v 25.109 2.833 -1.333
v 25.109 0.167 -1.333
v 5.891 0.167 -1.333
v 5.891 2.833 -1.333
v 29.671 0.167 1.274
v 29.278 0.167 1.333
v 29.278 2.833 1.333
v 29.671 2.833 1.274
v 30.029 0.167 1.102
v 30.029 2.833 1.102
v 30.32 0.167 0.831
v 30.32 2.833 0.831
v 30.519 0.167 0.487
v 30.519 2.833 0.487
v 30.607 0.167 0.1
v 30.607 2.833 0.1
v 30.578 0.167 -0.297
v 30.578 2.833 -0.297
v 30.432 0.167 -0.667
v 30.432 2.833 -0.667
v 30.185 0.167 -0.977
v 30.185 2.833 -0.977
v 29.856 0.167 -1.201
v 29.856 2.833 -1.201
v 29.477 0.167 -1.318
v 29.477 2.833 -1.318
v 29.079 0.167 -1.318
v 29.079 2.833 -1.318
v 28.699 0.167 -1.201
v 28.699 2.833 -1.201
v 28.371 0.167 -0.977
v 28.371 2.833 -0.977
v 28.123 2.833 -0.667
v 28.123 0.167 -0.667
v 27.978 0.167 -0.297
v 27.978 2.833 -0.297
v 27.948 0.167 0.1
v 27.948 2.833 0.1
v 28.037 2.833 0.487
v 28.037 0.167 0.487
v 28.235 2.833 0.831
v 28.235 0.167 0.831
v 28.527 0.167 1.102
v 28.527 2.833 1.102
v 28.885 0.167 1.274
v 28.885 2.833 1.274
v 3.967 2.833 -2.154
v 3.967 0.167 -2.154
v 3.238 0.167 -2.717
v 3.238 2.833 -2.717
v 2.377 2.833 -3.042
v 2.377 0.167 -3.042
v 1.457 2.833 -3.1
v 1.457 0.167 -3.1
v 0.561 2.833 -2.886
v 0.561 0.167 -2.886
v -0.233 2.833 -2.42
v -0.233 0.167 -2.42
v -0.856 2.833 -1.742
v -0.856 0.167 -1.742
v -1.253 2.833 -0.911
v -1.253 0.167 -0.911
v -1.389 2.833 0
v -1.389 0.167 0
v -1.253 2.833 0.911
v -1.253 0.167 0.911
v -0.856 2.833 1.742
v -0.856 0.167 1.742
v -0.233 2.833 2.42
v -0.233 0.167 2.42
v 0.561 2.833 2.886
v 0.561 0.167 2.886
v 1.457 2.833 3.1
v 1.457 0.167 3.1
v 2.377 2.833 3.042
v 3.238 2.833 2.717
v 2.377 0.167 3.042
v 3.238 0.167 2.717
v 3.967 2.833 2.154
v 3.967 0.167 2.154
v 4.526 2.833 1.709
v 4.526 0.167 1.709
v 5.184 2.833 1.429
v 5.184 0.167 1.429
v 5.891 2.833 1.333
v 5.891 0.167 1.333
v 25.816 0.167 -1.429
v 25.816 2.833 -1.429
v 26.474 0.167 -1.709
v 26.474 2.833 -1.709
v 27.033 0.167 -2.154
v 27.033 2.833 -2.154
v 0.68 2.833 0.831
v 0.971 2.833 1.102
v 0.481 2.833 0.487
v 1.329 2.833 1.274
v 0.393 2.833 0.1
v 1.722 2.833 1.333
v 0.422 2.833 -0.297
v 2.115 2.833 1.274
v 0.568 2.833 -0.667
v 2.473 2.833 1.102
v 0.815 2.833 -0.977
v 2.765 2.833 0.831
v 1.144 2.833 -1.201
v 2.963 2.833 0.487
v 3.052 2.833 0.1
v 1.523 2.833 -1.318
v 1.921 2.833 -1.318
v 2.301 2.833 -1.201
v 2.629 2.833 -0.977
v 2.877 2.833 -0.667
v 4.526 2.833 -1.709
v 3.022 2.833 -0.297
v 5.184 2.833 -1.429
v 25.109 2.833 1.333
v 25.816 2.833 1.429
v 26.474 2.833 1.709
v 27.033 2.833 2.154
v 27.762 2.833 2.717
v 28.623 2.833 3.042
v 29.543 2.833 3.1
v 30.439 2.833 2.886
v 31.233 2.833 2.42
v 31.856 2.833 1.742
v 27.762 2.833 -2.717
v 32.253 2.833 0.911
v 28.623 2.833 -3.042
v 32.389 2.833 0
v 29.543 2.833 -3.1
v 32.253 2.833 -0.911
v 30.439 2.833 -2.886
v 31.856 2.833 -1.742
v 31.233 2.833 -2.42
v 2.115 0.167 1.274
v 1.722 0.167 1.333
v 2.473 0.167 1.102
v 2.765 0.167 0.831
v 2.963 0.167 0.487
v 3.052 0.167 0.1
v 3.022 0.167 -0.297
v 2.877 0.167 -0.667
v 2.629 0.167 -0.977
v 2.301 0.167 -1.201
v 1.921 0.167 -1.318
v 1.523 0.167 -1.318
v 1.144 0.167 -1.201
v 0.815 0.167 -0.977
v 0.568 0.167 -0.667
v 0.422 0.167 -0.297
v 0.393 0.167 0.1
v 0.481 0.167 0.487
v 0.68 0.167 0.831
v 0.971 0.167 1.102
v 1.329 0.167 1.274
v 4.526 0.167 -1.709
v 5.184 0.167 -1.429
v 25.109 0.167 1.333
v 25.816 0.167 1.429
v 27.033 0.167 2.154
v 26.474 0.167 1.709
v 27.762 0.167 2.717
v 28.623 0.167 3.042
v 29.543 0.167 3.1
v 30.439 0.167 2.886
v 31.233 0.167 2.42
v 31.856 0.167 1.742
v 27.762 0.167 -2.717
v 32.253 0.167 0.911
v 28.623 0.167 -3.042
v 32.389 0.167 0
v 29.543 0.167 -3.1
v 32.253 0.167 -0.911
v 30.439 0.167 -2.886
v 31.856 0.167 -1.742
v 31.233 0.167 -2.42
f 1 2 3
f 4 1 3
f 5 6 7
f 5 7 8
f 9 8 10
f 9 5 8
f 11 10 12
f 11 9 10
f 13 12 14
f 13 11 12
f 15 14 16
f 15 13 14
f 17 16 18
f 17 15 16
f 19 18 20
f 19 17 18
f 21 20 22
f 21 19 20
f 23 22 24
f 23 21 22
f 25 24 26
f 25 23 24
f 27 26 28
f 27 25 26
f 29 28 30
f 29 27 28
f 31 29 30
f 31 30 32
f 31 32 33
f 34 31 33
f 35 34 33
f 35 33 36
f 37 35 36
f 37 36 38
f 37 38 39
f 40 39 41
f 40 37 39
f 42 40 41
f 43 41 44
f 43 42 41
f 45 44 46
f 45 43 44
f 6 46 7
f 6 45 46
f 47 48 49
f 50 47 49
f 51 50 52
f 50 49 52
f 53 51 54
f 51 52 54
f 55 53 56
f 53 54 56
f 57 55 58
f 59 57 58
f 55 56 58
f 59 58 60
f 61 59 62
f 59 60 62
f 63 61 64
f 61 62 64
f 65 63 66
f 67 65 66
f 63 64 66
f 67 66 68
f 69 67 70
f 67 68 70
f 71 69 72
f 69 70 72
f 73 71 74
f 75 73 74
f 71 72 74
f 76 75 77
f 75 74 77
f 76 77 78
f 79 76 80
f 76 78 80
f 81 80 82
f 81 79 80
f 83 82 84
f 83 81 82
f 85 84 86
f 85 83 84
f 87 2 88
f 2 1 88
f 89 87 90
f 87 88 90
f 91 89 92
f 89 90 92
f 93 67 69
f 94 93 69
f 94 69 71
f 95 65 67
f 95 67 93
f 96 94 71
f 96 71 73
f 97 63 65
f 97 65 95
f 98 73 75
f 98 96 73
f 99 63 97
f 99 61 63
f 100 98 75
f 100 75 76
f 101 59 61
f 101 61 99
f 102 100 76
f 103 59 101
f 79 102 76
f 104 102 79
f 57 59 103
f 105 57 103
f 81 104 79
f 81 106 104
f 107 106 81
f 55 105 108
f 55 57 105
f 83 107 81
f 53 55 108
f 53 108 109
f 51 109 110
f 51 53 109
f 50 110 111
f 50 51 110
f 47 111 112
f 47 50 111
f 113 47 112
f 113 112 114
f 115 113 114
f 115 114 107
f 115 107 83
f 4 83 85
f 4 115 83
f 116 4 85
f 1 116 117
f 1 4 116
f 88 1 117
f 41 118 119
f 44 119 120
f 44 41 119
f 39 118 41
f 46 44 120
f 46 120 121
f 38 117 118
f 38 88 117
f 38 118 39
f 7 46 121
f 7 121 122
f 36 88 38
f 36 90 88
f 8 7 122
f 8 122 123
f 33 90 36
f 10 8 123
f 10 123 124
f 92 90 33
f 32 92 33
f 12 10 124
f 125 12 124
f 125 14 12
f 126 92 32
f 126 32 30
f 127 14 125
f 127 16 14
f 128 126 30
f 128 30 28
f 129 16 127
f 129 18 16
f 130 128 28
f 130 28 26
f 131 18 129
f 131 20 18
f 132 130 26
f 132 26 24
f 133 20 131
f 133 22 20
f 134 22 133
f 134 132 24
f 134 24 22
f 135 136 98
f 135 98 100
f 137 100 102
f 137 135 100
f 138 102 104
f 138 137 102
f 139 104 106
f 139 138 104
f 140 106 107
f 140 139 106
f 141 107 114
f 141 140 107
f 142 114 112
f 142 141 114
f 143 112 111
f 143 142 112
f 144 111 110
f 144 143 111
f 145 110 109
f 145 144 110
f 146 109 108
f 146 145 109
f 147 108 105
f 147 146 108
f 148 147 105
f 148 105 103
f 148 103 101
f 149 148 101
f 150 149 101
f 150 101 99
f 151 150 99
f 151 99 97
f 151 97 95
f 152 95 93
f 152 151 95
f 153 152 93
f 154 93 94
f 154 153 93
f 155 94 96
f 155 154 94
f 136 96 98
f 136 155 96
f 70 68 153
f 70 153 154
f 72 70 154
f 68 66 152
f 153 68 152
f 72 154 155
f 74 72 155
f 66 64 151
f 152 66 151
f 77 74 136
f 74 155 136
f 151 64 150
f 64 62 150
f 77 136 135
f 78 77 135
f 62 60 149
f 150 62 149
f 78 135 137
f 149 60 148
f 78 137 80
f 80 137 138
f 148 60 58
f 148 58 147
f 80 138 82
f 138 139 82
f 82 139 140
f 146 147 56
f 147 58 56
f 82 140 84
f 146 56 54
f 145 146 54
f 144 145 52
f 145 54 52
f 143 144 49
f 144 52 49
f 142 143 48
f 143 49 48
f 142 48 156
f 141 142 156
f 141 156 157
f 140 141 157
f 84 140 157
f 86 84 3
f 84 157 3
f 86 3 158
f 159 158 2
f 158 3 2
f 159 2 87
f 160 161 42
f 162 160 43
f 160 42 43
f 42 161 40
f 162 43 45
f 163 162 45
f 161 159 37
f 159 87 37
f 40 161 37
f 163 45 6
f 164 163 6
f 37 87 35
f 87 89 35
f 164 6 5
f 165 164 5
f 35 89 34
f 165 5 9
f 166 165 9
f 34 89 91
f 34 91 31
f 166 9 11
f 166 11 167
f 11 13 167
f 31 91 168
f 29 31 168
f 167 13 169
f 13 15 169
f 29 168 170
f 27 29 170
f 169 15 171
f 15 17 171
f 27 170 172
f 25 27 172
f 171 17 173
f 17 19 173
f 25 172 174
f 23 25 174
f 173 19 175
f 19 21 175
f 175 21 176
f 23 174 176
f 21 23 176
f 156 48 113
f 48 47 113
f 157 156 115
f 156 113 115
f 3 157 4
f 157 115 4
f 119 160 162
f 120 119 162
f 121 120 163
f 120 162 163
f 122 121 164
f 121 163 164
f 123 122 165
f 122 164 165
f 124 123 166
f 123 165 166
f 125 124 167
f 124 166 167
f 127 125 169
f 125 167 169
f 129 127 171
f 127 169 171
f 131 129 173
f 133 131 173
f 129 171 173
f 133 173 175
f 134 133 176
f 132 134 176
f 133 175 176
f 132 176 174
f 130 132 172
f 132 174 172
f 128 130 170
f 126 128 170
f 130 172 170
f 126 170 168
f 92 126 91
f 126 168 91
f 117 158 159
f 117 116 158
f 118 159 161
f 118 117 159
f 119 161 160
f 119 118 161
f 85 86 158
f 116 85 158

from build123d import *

# Parameters (mm, degrees)
SKETCH1_R           = 1.5
BOSS_EXTRUDE1_DEPTH = 3
FILLET1_R           = 3
SCALE1_SCALE        = 0.888888889


with BuildPart() as part:
    # Sketch1 → Boss-Extrude1 (new body)
    with BuildSketch(Plane(origin=(0, 0, 0), x_dir=(1, 0, 0), z_dir=(0, 1, 0))):
        with BuildLine():
            ThreePointArc((3.16227766, 1.5), (-3.5, 0), (3.16227766, -1.5))
            Line((3.16227766, -1.5), (27.83772234, -1.5))
            ThreePointArc((27.83772234, -1.5), (34.5, 0), (27.83772234, 1.5))
            Line((27.83772234, 1.5), (3.16227766, 1.5))
        make_face()
        with Locations(Location((0, 0, 0), (0, 0, 270))):
            Circle(SKETCH1_R, mode=Mode.SUBTRACT)
        with Locations(Location((31, 0, 0), (0, 0, 270))):
            Circle(SKETCH1_R, mode=Mode.SUBTRACT)
    extrude(amount=BOSS_EXTRUDE1_DEPTH)

    # Fillet1
    fillet1_edges = [part.edges().sort_by_distance(p)[0] for p in [
        (27.83772234, 1.5, 1.5),
        (3.16227766, 1.5, 1.5),
        (3.16227766, 1.5, -1.5),
        (27.83772234, 1.5, -1.5),
    ]]
    fillet(fillet1_edges, radius=FILLET1_R)


with BuildPart() as part_1:
    # Scale1: scaled about (15.5, 1.5, 0)
    add(part.part.scale(SCALE1_SCALE).moved(Location((1.722222222, 0.166666667, 0))))


solid = part_1.part
